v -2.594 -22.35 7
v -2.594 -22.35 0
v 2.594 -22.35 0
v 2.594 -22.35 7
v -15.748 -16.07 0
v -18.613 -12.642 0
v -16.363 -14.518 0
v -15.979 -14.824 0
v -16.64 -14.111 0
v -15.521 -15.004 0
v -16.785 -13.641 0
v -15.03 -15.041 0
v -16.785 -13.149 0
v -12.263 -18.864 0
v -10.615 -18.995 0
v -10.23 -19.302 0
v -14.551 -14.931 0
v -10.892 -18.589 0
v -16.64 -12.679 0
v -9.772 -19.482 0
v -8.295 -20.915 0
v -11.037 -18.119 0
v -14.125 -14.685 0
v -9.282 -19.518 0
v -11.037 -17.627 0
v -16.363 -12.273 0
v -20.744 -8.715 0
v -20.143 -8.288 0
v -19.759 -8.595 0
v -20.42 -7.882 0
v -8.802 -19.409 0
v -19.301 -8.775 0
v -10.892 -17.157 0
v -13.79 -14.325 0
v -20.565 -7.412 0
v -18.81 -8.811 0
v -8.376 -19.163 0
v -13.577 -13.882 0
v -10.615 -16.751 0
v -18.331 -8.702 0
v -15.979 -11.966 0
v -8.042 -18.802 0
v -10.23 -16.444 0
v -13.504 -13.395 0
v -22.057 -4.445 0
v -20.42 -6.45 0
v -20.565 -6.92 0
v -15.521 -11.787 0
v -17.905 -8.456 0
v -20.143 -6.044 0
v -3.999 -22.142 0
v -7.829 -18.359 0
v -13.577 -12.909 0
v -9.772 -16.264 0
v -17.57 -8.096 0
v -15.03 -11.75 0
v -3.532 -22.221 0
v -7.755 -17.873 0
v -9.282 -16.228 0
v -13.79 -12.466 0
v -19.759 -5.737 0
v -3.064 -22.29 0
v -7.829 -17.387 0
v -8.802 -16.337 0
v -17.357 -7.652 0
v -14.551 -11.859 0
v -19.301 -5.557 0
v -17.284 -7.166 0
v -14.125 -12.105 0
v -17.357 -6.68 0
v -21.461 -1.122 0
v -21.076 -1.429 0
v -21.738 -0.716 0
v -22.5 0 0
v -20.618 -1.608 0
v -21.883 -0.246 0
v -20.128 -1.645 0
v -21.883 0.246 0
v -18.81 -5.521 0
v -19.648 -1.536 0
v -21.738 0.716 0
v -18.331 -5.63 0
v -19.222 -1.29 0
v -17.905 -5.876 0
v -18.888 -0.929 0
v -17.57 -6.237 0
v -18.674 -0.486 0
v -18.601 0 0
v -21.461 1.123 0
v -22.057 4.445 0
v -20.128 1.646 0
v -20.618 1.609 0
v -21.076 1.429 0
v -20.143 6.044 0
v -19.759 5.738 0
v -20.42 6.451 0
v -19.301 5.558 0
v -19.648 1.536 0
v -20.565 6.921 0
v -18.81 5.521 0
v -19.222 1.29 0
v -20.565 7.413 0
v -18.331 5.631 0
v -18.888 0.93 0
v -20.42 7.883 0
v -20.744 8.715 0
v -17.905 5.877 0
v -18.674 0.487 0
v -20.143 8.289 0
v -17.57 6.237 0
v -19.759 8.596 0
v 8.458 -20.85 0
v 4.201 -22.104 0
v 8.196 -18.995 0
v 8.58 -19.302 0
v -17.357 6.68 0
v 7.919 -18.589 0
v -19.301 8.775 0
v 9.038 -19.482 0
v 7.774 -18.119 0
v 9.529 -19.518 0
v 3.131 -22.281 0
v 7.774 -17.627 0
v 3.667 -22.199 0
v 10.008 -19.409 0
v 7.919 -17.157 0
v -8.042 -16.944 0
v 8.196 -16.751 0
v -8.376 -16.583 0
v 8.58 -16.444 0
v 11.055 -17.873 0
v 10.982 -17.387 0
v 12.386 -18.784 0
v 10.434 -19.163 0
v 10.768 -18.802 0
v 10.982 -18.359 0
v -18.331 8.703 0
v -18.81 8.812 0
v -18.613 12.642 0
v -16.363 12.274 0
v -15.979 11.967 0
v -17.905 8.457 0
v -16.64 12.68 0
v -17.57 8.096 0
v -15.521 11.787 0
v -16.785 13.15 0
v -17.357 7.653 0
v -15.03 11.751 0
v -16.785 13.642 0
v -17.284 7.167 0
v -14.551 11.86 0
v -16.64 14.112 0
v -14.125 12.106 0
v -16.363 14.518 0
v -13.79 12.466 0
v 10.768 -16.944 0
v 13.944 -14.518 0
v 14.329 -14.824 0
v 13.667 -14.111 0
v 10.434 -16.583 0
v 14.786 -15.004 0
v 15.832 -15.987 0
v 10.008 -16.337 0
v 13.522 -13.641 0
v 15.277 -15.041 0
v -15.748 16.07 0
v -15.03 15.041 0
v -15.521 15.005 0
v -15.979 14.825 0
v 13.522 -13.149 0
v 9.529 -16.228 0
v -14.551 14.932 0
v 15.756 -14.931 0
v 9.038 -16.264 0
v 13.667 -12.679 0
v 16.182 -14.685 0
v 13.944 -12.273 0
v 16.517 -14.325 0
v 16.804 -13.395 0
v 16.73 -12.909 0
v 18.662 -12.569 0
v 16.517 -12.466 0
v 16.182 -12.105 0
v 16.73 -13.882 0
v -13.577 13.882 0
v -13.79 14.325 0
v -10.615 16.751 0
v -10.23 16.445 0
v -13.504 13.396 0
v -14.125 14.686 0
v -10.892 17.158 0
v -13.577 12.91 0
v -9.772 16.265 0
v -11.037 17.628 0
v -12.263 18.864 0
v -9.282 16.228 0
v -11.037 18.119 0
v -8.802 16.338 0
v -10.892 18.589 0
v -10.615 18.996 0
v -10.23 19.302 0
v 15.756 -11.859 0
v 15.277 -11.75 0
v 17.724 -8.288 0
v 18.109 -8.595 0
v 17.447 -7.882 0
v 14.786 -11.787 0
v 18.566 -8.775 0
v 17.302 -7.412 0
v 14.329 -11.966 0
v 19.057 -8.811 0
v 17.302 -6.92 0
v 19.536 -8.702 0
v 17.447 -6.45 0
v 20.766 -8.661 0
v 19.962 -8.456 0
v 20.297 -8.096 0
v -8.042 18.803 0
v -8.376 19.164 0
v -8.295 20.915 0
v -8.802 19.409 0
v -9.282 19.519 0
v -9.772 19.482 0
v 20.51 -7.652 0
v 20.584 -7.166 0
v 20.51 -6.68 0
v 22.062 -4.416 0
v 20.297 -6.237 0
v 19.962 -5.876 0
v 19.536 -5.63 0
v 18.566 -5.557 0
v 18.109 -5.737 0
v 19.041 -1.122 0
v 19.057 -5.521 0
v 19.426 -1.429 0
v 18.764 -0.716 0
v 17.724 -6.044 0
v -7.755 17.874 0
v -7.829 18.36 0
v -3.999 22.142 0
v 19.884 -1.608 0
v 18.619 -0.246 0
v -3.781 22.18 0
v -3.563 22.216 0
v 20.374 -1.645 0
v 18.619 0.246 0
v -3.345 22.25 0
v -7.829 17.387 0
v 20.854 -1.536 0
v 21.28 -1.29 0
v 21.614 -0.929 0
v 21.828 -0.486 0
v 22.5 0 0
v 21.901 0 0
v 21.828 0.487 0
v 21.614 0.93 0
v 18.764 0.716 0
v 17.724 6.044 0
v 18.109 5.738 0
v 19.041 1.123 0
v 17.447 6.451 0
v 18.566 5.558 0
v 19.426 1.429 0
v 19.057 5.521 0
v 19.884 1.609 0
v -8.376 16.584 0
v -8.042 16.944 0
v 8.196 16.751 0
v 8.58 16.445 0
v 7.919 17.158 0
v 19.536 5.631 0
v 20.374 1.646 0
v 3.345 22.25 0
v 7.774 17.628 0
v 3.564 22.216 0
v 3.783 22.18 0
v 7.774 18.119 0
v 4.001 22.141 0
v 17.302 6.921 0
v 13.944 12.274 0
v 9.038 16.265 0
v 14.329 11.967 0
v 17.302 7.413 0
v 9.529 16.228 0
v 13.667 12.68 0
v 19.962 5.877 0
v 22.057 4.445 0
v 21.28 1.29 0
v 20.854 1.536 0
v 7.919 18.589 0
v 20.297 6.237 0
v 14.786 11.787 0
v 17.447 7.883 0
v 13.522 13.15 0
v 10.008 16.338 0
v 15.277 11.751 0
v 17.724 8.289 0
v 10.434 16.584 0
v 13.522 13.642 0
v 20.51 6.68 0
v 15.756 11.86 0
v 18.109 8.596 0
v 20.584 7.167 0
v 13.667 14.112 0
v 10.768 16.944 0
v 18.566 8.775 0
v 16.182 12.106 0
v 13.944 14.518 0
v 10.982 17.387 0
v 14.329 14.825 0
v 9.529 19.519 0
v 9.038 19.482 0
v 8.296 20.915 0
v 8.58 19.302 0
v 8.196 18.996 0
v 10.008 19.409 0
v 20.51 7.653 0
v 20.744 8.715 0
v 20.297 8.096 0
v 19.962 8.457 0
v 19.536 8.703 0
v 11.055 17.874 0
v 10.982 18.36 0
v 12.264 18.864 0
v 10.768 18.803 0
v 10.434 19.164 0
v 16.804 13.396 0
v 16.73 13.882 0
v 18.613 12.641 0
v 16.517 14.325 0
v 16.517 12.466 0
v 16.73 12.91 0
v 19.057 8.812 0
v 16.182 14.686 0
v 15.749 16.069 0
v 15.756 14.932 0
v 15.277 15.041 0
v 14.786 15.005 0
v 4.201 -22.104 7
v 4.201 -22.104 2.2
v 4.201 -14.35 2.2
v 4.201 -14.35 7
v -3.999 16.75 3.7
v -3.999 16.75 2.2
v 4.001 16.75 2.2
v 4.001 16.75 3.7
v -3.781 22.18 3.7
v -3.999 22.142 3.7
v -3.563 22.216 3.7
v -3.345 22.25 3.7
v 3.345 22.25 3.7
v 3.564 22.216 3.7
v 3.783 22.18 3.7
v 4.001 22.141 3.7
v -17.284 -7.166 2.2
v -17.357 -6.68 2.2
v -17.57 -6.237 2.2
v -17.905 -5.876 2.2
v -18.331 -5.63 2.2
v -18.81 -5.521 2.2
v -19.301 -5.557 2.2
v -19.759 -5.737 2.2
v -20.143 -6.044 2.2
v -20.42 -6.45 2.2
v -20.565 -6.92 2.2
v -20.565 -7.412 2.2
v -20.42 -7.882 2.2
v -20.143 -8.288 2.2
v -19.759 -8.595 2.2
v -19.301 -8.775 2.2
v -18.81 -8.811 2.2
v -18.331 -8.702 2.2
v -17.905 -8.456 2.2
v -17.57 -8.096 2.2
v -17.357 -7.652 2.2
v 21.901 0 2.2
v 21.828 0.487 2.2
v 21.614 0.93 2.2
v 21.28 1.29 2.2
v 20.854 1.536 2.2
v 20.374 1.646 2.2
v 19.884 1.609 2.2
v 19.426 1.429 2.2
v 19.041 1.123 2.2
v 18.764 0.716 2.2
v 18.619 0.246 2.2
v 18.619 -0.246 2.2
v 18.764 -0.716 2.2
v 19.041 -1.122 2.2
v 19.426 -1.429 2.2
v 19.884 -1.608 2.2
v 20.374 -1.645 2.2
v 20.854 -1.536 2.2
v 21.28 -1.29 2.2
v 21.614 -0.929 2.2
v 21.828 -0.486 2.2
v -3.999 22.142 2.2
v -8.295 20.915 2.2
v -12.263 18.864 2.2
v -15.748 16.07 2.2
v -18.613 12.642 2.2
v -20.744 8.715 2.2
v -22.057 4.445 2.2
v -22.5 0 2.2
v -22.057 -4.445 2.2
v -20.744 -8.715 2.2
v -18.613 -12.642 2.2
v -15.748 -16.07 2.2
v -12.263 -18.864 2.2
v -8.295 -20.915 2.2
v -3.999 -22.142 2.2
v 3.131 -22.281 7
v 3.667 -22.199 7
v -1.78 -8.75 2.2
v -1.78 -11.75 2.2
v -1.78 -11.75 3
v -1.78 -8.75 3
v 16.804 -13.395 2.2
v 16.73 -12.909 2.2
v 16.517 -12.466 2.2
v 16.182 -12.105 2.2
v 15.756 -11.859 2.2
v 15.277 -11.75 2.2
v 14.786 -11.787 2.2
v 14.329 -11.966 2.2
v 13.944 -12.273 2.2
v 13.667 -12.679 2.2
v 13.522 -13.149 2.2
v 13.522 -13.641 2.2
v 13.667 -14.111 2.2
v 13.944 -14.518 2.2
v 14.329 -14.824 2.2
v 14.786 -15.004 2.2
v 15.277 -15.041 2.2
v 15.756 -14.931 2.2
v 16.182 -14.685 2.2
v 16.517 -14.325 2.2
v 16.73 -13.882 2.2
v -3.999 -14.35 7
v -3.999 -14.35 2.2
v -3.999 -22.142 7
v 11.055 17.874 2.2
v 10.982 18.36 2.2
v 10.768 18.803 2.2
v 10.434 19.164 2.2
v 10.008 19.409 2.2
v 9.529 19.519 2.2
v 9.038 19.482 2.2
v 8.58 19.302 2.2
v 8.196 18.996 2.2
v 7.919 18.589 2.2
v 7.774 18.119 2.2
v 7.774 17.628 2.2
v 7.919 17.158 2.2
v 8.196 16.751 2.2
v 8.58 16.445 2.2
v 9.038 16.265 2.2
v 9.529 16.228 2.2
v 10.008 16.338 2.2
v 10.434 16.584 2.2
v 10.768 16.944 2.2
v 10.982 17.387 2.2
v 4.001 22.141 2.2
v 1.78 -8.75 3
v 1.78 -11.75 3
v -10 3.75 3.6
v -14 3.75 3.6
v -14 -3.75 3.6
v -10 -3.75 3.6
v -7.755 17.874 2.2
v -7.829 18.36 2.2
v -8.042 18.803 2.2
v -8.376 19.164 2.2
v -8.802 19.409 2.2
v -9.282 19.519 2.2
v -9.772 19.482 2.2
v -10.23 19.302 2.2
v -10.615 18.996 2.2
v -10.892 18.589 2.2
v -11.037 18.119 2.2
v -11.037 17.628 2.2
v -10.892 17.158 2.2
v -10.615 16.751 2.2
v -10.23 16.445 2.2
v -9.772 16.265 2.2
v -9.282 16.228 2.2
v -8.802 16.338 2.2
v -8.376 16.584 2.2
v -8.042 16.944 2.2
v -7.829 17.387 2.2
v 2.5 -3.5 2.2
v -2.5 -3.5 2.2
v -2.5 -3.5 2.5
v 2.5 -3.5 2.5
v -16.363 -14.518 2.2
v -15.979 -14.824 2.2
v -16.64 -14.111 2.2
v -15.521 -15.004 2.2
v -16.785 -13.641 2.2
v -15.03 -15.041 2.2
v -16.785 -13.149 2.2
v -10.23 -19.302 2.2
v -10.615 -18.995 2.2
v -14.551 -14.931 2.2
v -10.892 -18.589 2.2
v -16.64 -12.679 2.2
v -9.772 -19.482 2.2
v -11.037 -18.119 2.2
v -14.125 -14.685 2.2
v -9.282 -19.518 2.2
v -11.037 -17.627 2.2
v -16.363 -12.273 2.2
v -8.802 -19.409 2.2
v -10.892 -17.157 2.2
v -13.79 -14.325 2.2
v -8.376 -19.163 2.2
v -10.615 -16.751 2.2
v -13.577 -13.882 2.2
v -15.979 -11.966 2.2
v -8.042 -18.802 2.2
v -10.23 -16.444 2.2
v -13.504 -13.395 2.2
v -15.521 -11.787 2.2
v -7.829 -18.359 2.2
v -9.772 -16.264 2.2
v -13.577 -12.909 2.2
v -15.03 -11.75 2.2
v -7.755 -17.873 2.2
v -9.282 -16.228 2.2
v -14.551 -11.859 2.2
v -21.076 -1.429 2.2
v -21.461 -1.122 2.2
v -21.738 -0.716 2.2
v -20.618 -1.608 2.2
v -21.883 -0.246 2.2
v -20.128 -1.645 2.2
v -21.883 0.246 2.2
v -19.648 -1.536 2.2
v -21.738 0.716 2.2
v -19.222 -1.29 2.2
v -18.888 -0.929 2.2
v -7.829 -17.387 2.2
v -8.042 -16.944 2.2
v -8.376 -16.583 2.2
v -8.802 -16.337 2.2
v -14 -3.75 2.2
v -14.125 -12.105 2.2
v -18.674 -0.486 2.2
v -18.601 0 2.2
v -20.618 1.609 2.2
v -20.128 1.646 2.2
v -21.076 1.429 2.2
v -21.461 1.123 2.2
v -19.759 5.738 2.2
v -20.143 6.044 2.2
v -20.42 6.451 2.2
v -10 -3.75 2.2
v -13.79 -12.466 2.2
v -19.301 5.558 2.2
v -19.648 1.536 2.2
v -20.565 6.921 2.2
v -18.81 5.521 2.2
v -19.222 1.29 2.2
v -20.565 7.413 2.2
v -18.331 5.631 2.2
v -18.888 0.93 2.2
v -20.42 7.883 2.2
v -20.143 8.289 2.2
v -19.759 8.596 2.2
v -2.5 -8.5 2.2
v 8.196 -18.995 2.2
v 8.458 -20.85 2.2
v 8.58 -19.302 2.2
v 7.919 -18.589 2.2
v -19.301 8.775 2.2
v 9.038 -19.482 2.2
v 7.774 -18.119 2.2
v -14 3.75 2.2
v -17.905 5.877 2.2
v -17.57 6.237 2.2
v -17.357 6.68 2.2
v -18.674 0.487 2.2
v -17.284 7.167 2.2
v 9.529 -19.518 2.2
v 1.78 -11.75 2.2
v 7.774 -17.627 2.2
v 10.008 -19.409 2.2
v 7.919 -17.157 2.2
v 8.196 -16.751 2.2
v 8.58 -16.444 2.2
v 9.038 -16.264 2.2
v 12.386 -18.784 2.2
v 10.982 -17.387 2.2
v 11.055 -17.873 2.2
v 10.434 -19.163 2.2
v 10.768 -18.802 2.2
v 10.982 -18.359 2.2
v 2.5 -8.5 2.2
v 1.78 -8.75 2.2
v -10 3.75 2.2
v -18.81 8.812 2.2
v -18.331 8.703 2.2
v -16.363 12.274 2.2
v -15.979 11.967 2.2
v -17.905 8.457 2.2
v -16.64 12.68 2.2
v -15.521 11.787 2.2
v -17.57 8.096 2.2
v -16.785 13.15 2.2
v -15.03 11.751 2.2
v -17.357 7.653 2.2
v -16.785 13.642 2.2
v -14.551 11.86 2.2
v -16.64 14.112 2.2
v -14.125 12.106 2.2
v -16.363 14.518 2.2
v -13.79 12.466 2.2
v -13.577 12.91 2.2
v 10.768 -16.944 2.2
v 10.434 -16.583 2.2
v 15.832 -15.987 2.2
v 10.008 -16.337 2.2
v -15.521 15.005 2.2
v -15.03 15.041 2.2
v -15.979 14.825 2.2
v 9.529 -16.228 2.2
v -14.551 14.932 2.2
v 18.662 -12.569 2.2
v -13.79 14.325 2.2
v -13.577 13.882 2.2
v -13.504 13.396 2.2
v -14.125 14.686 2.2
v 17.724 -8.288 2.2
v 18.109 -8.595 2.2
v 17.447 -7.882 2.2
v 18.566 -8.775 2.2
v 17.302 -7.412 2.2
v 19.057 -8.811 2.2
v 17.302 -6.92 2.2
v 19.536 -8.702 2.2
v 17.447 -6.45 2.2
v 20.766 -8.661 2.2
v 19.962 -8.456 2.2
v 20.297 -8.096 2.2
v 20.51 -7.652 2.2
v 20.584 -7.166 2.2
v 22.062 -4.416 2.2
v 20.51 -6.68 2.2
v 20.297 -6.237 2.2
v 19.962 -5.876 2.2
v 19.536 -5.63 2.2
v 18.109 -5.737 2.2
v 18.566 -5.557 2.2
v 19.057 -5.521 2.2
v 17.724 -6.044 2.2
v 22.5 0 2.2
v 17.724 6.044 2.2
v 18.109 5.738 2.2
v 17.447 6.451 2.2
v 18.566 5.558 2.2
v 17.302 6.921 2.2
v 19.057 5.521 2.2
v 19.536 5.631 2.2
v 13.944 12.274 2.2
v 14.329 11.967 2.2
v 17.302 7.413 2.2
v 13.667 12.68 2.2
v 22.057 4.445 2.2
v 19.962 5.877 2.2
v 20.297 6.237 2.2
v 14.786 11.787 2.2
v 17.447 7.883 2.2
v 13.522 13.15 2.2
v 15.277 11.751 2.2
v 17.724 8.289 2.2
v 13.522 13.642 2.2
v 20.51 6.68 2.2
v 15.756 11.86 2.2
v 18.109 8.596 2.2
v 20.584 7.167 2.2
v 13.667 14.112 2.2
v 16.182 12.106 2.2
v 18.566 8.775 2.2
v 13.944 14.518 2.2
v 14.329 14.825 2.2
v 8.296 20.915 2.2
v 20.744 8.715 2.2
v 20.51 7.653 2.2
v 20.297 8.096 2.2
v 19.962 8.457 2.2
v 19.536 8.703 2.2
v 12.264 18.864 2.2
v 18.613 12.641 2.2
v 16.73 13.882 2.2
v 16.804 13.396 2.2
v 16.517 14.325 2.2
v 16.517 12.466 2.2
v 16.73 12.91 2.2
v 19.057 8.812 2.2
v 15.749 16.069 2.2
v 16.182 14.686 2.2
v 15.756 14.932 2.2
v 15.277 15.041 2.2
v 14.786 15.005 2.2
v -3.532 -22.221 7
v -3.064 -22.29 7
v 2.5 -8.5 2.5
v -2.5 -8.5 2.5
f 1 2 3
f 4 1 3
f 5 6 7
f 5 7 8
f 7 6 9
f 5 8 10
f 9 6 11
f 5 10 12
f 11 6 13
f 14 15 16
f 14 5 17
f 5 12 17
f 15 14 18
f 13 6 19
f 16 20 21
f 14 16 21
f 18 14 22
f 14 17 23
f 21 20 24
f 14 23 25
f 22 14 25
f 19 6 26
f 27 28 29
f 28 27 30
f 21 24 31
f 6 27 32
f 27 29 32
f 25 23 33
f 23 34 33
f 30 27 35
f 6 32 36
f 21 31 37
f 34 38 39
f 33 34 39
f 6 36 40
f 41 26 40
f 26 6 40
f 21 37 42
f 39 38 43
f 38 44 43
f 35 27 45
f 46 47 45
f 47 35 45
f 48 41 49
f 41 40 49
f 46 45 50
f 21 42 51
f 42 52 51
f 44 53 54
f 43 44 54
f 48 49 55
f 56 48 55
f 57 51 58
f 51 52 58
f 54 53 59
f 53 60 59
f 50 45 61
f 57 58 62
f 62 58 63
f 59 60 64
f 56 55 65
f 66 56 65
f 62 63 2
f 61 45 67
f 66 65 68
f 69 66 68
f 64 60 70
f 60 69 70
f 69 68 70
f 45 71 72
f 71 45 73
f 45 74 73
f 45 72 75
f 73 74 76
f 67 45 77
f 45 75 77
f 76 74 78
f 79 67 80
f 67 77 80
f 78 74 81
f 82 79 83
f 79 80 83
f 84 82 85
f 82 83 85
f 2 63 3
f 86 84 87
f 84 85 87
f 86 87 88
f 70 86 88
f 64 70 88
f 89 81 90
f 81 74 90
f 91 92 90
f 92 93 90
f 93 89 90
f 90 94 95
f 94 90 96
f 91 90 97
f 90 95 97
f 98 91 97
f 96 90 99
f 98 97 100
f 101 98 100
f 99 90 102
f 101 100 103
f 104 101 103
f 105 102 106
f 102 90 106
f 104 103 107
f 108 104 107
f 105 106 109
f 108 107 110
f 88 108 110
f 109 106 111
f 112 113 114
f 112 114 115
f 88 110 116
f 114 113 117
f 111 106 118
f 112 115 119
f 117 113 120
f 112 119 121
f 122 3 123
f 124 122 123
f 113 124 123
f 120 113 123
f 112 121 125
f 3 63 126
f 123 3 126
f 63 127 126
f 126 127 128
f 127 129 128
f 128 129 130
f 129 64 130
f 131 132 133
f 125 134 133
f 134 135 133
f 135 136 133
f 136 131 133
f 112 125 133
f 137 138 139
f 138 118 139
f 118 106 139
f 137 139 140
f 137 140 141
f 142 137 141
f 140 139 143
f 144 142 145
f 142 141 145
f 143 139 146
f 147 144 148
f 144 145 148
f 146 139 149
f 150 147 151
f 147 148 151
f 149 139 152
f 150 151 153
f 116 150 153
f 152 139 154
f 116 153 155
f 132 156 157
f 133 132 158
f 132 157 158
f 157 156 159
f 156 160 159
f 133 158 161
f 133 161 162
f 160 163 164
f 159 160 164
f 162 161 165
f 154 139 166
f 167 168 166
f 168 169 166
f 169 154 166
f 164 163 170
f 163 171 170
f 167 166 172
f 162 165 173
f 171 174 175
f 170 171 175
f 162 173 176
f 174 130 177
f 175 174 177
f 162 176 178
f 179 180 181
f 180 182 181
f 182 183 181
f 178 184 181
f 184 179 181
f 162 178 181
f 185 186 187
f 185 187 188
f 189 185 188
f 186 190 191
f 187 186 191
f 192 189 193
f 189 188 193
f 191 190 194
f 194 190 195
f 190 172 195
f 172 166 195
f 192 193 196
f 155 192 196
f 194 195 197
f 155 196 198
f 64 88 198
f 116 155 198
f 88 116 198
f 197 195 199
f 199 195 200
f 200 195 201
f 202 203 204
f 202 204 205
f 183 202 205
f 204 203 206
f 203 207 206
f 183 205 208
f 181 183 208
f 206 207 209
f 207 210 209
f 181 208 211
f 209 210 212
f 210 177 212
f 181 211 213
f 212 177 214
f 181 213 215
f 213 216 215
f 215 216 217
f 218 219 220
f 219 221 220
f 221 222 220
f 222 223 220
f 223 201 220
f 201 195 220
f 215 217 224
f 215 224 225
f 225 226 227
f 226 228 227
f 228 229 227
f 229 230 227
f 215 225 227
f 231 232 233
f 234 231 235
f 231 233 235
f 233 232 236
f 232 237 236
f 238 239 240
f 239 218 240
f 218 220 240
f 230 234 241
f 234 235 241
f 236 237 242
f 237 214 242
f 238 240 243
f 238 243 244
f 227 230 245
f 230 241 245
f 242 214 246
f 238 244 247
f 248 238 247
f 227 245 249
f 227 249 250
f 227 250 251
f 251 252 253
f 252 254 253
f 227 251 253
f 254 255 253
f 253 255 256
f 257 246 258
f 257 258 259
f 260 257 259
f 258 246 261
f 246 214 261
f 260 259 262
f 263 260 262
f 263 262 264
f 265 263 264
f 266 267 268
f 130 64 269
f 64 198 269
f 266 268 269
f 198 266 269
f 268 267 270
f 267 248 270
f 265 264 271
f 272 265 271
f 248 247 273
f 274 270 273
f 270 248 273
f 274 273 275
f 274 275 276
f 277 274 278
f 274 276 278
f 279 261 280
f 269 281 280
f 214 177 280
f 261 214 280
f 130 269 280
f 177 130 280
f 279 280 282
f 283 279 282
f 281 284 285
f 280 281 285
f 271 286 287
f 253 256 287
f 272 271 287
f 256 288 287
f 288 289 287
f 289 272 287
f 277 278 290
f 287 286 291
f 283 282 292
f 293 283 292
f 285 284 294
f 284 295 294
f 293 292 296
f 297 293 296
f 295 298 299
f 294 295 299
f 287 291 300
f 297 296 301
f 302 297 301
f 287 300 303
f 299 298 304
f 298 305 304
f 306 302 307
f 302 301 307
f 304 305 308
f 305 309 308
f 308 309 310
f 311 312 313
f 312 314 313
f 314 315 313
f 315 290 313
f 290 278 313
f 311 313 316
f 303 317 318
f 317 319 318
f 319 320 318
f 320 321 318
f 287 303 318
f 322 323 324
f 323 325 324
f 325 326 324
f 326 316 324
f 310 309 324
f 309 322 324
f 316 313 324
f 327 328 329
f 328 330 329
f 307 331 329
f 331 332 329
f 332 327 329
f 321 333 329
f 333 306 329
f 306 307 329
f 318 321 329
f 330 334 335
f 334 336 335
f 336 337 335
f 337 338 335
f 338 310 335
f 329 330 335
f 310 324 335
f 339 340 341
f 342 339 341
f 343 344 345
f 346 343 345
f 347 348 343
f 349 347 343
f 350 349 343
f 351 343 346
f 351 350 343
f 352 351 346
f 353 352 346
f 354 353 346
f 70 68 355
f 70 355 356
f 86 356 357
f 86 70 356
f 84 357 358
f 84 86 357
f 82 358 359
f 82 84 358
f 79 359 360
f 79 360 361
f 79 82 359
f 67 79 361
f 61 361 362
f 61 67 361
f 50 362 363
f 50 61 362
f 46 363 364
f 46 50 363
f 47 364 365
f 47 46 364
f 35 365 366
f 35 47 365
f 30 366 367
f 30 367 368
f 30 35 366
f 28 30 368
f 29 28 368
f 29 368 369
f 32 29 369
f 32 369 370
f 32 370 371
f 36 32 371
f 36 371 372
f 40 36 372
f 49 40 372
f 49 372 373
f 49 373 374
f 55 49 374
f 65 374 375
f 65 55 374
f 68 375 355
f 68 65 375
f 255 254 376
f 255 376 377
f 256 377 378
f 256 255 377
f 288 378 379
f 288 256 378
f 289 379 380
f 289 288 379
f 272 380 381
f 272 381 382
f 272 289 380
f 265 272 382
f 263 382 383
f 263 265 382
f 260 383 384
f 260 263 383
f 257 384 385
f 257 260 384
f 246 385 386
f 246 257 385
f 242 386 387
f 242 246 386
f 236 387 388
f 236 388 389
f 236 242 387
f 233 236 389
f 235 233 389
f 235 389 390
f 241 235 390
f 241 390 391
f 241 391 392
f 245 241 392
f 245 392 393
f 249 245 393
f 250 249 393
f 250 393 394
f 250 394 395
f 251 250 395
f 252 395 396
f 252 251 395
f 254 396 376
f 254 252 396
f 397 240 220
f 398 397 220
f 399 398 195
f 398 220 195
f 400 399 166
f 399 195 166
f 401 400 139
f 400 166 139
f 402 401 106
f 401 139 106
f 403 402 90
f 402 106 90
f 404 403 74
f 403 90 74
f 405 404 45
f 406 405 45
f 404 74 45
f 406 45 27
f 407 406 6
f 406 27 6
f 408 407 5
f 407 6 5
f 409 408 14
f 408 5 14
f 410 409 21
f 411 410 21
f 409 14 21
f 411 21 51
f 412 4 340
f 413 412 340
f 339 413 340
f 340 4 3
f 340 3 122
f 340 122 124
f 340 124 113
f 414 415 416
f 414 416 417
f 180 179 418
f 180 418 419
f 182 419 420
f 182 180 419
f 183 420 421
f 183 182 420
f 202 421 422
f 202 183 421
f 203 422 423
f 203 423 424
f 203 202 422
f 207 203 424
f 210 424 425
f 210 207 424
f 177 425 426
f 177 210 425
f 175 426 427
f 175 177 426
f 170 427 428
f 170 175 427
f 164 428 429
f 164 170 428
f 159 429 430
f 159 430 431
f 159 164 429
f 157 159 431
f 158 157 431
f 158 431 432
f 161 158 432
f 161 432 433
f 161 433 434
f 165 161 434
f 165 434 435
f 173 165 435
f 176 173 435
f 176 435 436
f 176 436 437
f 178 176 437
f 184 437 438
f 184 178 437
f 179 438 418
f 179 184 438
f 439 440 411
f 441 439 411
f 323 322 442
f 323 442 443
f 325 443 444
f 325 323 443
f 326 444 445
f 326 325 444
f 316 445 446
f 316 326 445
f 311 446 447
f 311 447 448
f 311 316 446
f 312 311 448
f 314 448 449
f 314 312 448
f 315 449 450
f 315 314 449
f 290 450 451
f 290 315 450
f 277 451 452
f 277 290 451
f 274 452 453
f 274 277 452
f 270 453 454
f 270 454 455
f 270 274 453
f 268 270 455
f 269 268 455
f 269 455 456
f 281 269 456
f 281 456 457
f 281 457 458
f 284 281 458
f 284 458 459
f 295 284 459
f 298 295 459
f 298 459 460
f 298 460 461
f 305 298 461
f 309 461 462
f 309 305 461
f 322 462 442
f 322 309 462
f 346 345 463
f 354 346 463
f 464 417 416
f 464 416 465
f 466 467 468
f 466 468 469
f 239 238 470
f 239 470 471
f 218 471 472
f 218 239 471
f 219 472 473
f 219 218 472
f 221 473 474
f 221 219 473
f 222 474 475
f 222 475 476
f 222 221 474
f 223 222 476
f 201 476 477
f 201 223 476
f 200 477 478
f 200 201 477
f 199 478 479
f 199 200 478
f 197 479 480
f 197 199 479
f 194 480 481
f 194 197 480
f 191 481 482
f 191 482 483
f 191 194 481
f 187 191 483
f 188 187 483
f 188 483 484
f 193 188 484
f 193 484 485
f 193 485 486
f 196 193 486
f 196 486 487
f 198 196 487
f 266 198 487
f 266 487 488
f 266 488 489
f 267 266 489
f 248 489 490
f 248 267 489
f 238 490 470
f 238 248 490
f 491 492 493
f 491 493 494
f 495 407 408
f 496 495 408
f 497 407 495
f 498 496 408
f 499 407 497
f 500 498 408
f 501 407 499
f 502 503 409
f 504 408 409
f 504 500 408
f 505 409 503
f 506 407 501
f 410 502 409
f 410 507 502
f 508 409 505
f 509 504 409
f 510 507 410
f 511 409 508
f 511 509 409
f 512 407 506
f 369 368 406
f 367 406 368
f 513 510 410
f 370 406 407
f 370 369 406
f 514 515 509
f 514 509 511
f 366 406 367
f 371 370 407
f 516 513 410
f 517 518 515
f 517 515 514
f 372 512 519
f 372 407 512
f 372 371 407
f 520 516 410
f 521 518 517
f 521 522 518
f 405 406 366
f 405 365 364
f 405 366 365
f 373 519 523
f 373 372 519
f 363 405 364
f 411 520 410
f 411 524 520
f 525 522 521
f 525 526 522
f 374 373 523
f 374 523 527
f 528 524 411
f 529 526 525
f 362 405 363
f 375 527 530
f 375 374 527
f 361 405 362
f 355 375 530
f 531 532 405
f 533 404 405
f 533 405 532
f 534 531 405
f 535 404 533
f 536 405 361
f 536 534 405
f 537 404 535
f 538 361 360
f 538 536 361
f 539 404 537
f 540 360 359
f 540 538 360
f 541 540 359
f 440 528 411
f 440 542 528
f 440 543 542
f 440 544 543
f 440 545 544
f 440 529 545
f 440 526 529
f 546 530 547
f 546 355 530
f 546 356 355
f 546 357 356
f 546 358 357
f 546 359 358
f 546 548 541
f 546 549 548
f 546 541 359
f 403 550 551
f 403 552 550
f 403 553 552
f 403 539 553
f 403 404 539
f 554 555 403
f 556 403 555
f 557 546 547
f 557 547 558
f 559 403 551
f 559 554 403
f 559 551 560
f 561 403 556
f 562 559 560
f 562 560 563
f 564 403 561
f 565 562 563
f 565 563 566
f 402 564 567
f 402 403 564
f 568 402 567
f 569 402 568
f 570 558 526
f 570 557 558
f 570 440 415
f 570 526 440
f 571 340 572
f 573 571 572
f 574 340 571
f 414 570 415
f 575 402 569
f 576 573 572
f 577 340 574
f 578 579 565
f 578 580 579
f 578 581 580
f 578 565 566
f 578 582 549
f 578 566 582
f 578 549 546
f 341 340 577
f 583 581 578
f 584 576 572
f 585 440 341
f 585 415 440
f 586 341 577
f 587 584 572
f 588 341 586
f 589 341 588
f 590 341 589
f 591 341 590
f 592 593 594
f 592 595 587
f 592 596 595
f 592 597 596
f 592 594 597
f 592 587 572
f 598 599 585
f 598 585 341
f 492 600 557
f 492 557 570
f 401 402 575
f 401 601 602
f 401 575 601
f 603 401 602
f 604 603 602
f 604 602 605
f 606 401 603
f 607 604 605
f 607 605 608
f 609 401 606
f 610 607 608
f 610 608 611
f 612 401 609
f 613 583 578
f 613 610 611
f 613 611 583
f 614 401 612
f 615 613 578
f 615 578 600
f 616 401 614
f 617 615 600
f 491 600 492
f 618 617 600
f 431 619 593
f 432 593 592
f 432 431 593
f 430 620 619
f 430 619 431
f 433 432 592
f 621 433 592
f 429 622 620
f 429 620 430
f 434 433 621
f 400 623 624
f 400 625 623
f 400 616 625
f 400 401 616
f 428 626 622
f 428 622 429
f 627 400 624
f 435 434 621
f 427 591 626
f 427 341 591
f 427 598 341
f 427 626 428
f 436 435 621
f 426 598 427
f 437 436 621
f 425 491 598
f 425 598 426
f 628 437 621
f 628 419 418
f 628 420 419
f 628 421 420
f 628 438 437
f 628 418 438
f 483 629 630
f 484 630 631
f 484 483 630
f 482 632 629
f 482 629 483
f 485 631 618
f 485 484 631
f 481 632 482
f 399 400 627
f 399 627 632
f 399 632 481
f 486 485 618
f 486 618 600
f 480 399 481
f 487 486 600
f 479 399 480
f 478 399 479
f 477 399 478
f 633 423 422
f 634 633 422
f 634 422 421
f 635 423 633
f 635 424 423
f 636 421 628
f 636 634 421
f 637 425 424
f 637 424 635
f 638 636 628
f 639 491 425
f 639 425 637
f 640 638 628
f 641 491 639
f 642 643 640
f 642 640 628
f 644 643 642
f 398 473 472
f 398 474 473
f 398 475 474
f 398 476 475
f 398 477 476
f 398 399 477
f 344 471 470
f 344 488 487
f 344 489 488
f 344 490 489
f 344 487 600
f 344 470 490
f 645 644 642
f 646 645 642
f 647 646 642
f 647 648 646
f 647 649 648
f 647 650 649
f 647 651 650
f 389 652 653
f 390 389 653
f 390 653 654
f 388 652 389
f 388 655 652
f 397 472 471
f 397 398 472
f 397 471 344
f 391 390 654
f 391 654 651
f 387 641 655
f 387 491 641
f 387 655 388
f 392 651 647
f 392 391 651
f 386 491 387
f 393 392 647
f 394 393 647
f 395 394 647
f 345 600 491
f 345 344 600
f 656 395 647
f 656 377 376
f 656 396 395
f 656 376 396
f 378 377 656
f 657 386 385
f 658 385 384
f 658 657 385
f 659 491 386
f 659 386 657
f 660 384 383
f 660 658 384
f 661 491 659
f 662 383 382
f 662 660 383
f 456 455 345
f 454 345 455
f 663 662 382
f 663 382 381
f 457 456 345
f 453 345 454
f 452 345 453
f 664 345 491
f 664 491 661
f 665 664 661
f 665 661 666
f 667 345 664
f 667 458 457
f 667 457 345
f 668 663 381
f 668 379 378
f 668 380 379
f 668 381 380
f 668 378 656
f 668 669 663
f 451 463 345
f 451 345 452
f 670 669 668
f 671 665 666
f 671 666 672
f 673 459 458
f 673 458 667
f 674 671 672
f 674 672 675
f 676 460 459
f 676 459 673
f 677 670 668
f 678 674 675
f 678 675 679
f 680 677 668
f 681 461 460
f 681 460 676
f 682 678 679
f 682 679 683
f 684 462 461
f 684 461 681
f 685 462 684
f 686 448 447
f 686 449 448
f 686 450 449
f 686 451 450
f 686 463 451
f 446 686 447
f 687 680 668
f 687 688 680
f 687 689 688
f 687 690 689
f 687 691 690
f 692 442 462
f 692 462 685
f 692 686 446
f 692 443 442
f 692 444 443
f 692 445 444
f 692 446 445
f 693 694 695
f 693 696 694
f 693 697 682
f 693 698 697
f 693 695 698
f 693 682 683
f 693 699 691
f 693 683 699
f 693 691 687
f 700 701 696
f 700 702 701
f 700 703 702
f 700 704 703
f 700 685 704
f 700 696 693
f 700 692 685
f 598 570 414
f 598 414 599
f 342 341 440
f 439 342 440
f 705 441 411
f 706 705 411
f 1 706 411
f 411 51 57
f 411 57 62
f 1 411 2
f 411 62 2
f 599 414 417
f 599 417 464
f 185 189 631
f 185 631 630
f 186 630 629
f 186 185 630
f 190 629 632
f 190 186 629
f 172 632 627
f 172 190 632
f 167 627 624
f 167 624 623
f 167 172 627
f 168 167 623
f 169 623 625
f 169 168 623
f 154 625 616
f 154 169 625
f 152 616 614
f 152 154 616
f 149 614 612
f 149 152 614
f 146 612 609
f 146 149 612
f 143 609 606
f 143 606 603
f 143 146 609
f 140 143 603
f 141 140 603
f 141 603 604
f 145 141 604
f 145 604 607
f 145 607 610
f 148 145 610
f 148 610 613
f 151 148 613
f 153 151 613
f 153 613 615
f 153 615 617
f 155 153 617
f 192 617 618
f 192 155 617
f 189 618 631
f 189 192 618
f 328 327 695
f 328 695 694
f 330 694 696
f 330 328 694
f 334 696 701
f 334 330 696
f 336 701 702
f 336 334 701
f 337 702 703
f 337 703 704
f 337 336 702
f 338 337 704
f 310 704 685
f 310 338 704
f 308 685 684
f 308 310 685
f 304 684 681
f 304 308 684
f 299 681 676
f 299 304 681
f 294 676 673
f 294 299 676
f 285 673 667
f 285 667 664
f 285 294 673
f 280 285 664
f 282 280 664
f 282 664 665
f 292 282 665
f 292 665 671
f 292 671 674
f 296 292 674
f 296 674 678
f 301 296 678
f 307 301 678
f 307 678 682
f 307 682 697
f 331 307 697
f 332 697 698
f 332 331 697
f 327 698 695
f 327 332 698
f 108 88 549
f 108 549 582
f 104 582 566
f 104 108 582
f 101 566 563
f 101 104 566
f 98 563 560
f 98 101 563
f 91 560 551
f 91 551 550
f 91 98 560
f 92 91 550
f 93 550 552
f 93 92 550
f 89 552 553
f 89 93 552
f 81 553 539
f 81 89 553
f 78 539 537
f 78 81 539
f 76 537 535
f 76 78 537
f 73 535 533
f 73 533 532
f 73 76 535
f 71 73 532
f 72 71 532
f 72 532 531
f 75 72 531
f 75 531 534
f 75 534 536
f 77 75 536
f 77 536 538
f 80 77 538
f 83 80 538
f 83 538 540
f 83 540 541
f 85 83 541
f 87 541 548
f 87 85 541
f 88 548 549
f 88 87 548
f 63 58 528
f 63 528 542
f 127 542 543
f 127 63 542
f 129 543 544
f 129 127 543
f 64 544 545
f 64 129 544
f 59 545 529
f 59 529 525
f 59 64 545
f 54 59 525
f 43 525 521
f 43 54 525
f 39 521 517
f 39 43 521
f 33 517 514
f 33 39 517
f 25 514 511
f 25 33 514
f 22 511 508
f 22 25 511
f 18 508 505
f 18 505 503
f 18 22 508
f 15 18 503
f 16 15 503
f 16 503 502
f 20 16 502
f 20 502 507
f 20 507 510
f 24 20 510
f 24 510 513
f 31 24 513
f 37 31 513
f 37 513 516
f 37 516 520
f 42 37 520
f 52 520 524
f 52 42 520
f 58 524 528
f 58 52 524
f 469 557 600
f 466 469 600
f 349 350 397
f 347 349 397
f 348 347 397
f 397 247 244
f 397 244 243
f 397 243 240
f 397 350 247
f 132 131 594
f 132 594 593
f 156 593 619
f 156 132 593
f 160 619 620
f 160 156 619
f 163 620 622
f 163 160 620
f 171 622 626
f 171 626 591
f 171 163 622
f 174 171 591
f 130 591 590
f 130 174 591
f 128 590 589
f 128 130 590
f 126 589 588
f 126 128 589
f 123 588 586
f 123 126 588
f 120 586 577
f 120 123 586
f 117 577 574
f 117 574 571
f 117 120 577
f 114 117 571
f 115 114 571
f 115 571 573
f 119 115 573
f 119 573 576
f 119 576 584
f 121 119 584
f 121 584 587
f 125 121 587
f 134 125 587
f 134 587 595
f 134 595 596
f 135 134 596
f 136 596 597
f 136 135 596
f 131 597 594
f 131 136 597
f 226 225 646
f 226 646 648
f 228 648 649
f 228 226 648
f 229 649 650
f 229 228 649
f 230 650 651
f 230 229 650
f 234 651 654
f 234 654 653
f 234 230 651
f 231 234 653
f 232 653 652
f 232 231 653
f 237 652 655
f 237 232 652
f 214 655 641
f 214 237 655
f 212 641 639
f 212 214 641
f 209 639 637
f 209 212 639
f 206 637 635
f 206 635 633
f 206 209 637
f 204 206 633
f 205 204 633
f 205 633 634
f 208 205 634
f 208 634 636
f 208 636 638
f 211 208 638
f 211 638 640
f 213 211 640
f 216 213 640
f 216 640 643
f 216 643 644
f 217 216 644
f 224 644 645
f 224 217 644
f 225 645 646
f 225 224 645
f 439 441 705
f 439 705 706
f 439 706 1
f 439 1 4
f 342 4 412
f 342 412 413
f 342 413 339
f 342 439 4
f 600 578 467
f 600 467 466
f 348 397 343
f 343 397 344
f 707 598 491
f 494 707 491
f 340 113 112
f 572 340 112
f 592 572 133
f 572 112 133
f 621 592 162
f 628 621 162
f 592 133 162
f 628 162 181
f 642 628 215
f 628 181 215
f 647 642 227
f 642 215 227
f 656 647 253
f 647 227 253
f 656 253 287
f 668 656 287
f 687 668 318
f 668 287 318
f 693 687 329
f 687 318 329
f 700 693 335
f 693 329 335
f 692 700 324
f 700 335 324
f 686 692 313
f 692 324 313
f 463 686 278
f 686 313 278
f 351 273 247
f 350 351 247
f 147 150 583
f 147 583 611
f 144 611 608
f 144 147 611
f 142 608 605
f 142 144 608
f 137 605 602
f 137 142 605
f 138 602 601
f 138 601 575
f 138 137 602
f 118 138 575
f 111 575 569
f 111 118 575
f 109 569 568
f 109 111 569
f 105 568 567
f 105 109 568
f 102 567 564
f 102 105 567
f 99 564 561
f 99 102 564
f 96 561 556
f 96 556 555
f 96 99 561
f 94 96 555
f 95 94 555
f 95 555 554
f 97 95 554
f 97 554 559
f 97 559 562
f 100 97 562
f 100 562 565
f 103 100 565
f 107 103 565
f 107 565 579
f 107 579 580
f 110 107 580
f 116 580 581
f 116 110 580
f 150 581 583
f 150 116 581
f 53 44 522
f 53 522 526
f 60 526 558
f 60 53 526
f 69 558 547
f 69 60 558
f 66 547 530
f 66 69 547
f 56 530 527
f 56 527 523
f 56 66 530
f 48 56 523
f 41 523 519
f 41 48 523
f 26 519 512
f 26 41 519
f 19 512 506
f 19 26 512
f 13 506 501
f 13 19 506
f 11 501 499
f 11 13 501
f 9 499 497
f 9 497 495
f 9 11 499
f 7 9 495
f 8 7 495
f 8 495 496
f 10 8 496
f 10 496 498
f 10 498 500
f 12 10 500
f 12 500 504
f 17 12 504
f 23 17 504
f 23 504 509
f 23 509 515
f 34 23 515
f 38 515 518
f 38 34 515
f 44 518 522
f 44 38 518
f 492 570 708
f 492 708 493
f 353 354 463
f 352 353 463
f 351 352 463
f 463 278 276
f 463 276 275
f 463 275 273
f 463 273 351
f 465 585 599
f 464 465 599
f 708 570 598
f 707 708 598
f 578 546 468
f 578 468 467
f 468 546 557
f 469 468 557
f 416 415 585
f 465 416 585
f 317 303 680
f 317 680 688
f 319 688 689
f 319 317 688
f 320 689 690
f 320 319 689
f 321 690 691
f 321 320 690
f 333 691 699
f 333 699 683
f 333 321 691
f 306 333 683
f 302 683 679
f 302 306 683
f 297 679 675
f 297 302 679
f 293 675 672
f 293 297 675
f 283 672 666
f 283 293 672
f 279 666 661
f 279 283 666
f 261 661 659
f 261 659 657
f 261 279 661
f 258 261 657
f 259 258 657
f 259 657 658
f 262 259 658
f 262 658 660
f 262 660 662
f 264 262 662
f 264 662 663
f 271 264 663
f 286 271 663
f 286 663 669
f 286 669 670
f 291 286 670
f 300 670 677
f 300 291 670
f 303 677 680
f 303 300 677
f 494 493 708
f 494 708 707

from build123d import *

# Parameters (mm, degrees)
F0_R     = 1.65
F0_W     = 3.56
F0_H     = 3
F0_W_2   = 5
F0_H_2   = 5
F0_W_3   = 4
F0_H_3   = 7.5
F1_DEPTH = 2.2
F2_DEPTH = 3.7
F3_DEPTH = 7
F4_DEPTH = 3.6
F5_DEPTH = 2.5
F6_DEPTH = 3


with BuildPart() as f1:
    # F0 (on Top) → F1 (new body)
    with BuildSketch(Plane.XY):
        with BuildLine():
            ThreePointArc((4.20097, -22.10434), (17.331645, -14.347965), (22.5, 0))
            ThreePointArc((22.5, 0), (17.266613, 14.42616), (4.00097, 22.141415))
            Line((4.00097, 22.141415), (4.00097, 16.75))
            Line((4.00097, 16.75), (-3.99903, 16.75))
            Line((-3.99903, 16.75), (-3.99903, 22.141765))
            ThreePointArc((-3.99903, 22.141765), (-22.5, 0), (-3.99903, -22.141765))
            Line((-3.99903, -22.141765), (-3.99903, -14.35))
            Line((-3.99903, -14.35), (4.20097, -14.35))
            Line((4.20097, -14.35), (4.20097, -22.10434))
        make_face()
        with Locations((-15.153525, -13.395359)):
            Circle(F0_R, mode=Mode.SUBTRACT)
        with Locations((-9.405204, -17.872991)):
            Circle(F0_R, mode=Mode.SUBTRACT)
        with Locations((-18.933541, -7.166085)):
            Circle(F0_R, mode=Mode.SUBTRACT)
        with Locations((9.405204, -17.872991)):
            Circle(F0_R, mode=Mode.SUBTRACT)
        with Locations((15.153525, -13.395359)):
            Circle(F0_R, mode=Mode.SUBTRACT)
        with Locations((0, -10.25)):
            Rectangle(F0_W, F0_H, mode=Mode.SUBTRACT)
        with Locations((0, -6)):
            Rectangle(F0_W_2, F0_H_2, mode=Mode.SUBTRACT)
        with Locations((18.933541, -7.166085)):
            Circle(F0_R, mode=Mode.SUBTRACT)
        with Locations((-20.25097, 0.000278)):
            Circle(F0_R, mode=Mode.SUBTRACT)
        with Locations((-12, 0)):
            Rectangle(F0_W_3, F0_H_3, mode=Mode.SUBTRACT)
        with Locations((-18.933541, 7.166641)):
            Circle(F0_R, mode=Mode.SUBTRACT)
        with Locations((-15.153525, 13.395914)):
            Circle(F0_R, mode=Mode.SUBTRACT)
        with Locations((-9.405204, 17.873546)):
            Circle(F0_R, mode=Mode.SUBTRACT)
        with Locations((20.25097, 0.000278)):
            Circle(F0_R, mode=Mode.SUBTRACT)
        with Locations((18.933541, 7.166641)):
            Circle(F0_R, mode=Mode.SUBTRACT)
        with Locations((9.405204, 17.873546)):
            Circle(F0_R, mode=Mode.SUBTRACT)
        with Locations((15.153525, 13.395914)):
            Circle(F0_R, mode=Mode.SUBTRACT)
    extrude(amount=F1_DEPTH)

    # F0 (on Top) → F2 (join)
    with BuildSketch(Plane.XY):
        with BuildLine():
            Line((4.00097, 16.75), (4.00097, 22.141415))
            ThreePointArc((4.00097, 22.141415), (3.673272, 22.198132), (3.344772, 22.25))
            Line((3.344772, 22.25), (-3.344772, 22.25))
            ThreePointArc((-3.344772, 22.25), (-3.6723, 22.198293), (-3.99903, 22.141765))
            Line((-3.99903, 22.141765), (-3.99903, 16.75))
            Line((-3.99903, 16.75), (4.00097, 16.75))
        make_face()
    extrude(amount=F2_DEPTH)

    # F0 (on Top) → F3 (join)
    with BuildSketch(Plane.XY):
        with BuildLine():
            ThreePointArc((2.593742, -22.35), (3.399576, -22.241692), (4.20097, -22.10434))
            Line((4.20097, -22.10434), (4.20097, -14.35))
            Line((4.20097, -14.35), (-3.99903, -14.35))
            Line((-3.99903, -14.35), (-3.99903, -22.141765))
            ThreePointArc((-3.99903, -22.141765), (-3.29803, -22.256976), (-2.593742, -22.35))
            Line((-2.593742, -22.35), (2.593742, -22.35))
        make_face()
    extrude(amount=F3_DEPTH)

    # F0 (on Top) → F4 (join)
    with BuildSketch(Plane.XY):
        with Locations((-12, 0)):
            Rectangle(F0_W_3, F0_H_3)
    extrude(amount=F4_DEPTH)

    # F0 (on Top) → F5 (join)
    with BuildSketch(Plane.XY):
        with Locations((0, -6)):
            Rectangle(F0_W_2, F0_H_2)
    extrude(amount=F5_DEPTH)

    # F0 (on Top) → F6 (join)
    with BuildSketch(Plane.XY):
        with Locations((0, -10.25)):
            Rectangle(F0_W, F0_H)
    extrude(amount=F6_DEPTH)


solid = f1.part
